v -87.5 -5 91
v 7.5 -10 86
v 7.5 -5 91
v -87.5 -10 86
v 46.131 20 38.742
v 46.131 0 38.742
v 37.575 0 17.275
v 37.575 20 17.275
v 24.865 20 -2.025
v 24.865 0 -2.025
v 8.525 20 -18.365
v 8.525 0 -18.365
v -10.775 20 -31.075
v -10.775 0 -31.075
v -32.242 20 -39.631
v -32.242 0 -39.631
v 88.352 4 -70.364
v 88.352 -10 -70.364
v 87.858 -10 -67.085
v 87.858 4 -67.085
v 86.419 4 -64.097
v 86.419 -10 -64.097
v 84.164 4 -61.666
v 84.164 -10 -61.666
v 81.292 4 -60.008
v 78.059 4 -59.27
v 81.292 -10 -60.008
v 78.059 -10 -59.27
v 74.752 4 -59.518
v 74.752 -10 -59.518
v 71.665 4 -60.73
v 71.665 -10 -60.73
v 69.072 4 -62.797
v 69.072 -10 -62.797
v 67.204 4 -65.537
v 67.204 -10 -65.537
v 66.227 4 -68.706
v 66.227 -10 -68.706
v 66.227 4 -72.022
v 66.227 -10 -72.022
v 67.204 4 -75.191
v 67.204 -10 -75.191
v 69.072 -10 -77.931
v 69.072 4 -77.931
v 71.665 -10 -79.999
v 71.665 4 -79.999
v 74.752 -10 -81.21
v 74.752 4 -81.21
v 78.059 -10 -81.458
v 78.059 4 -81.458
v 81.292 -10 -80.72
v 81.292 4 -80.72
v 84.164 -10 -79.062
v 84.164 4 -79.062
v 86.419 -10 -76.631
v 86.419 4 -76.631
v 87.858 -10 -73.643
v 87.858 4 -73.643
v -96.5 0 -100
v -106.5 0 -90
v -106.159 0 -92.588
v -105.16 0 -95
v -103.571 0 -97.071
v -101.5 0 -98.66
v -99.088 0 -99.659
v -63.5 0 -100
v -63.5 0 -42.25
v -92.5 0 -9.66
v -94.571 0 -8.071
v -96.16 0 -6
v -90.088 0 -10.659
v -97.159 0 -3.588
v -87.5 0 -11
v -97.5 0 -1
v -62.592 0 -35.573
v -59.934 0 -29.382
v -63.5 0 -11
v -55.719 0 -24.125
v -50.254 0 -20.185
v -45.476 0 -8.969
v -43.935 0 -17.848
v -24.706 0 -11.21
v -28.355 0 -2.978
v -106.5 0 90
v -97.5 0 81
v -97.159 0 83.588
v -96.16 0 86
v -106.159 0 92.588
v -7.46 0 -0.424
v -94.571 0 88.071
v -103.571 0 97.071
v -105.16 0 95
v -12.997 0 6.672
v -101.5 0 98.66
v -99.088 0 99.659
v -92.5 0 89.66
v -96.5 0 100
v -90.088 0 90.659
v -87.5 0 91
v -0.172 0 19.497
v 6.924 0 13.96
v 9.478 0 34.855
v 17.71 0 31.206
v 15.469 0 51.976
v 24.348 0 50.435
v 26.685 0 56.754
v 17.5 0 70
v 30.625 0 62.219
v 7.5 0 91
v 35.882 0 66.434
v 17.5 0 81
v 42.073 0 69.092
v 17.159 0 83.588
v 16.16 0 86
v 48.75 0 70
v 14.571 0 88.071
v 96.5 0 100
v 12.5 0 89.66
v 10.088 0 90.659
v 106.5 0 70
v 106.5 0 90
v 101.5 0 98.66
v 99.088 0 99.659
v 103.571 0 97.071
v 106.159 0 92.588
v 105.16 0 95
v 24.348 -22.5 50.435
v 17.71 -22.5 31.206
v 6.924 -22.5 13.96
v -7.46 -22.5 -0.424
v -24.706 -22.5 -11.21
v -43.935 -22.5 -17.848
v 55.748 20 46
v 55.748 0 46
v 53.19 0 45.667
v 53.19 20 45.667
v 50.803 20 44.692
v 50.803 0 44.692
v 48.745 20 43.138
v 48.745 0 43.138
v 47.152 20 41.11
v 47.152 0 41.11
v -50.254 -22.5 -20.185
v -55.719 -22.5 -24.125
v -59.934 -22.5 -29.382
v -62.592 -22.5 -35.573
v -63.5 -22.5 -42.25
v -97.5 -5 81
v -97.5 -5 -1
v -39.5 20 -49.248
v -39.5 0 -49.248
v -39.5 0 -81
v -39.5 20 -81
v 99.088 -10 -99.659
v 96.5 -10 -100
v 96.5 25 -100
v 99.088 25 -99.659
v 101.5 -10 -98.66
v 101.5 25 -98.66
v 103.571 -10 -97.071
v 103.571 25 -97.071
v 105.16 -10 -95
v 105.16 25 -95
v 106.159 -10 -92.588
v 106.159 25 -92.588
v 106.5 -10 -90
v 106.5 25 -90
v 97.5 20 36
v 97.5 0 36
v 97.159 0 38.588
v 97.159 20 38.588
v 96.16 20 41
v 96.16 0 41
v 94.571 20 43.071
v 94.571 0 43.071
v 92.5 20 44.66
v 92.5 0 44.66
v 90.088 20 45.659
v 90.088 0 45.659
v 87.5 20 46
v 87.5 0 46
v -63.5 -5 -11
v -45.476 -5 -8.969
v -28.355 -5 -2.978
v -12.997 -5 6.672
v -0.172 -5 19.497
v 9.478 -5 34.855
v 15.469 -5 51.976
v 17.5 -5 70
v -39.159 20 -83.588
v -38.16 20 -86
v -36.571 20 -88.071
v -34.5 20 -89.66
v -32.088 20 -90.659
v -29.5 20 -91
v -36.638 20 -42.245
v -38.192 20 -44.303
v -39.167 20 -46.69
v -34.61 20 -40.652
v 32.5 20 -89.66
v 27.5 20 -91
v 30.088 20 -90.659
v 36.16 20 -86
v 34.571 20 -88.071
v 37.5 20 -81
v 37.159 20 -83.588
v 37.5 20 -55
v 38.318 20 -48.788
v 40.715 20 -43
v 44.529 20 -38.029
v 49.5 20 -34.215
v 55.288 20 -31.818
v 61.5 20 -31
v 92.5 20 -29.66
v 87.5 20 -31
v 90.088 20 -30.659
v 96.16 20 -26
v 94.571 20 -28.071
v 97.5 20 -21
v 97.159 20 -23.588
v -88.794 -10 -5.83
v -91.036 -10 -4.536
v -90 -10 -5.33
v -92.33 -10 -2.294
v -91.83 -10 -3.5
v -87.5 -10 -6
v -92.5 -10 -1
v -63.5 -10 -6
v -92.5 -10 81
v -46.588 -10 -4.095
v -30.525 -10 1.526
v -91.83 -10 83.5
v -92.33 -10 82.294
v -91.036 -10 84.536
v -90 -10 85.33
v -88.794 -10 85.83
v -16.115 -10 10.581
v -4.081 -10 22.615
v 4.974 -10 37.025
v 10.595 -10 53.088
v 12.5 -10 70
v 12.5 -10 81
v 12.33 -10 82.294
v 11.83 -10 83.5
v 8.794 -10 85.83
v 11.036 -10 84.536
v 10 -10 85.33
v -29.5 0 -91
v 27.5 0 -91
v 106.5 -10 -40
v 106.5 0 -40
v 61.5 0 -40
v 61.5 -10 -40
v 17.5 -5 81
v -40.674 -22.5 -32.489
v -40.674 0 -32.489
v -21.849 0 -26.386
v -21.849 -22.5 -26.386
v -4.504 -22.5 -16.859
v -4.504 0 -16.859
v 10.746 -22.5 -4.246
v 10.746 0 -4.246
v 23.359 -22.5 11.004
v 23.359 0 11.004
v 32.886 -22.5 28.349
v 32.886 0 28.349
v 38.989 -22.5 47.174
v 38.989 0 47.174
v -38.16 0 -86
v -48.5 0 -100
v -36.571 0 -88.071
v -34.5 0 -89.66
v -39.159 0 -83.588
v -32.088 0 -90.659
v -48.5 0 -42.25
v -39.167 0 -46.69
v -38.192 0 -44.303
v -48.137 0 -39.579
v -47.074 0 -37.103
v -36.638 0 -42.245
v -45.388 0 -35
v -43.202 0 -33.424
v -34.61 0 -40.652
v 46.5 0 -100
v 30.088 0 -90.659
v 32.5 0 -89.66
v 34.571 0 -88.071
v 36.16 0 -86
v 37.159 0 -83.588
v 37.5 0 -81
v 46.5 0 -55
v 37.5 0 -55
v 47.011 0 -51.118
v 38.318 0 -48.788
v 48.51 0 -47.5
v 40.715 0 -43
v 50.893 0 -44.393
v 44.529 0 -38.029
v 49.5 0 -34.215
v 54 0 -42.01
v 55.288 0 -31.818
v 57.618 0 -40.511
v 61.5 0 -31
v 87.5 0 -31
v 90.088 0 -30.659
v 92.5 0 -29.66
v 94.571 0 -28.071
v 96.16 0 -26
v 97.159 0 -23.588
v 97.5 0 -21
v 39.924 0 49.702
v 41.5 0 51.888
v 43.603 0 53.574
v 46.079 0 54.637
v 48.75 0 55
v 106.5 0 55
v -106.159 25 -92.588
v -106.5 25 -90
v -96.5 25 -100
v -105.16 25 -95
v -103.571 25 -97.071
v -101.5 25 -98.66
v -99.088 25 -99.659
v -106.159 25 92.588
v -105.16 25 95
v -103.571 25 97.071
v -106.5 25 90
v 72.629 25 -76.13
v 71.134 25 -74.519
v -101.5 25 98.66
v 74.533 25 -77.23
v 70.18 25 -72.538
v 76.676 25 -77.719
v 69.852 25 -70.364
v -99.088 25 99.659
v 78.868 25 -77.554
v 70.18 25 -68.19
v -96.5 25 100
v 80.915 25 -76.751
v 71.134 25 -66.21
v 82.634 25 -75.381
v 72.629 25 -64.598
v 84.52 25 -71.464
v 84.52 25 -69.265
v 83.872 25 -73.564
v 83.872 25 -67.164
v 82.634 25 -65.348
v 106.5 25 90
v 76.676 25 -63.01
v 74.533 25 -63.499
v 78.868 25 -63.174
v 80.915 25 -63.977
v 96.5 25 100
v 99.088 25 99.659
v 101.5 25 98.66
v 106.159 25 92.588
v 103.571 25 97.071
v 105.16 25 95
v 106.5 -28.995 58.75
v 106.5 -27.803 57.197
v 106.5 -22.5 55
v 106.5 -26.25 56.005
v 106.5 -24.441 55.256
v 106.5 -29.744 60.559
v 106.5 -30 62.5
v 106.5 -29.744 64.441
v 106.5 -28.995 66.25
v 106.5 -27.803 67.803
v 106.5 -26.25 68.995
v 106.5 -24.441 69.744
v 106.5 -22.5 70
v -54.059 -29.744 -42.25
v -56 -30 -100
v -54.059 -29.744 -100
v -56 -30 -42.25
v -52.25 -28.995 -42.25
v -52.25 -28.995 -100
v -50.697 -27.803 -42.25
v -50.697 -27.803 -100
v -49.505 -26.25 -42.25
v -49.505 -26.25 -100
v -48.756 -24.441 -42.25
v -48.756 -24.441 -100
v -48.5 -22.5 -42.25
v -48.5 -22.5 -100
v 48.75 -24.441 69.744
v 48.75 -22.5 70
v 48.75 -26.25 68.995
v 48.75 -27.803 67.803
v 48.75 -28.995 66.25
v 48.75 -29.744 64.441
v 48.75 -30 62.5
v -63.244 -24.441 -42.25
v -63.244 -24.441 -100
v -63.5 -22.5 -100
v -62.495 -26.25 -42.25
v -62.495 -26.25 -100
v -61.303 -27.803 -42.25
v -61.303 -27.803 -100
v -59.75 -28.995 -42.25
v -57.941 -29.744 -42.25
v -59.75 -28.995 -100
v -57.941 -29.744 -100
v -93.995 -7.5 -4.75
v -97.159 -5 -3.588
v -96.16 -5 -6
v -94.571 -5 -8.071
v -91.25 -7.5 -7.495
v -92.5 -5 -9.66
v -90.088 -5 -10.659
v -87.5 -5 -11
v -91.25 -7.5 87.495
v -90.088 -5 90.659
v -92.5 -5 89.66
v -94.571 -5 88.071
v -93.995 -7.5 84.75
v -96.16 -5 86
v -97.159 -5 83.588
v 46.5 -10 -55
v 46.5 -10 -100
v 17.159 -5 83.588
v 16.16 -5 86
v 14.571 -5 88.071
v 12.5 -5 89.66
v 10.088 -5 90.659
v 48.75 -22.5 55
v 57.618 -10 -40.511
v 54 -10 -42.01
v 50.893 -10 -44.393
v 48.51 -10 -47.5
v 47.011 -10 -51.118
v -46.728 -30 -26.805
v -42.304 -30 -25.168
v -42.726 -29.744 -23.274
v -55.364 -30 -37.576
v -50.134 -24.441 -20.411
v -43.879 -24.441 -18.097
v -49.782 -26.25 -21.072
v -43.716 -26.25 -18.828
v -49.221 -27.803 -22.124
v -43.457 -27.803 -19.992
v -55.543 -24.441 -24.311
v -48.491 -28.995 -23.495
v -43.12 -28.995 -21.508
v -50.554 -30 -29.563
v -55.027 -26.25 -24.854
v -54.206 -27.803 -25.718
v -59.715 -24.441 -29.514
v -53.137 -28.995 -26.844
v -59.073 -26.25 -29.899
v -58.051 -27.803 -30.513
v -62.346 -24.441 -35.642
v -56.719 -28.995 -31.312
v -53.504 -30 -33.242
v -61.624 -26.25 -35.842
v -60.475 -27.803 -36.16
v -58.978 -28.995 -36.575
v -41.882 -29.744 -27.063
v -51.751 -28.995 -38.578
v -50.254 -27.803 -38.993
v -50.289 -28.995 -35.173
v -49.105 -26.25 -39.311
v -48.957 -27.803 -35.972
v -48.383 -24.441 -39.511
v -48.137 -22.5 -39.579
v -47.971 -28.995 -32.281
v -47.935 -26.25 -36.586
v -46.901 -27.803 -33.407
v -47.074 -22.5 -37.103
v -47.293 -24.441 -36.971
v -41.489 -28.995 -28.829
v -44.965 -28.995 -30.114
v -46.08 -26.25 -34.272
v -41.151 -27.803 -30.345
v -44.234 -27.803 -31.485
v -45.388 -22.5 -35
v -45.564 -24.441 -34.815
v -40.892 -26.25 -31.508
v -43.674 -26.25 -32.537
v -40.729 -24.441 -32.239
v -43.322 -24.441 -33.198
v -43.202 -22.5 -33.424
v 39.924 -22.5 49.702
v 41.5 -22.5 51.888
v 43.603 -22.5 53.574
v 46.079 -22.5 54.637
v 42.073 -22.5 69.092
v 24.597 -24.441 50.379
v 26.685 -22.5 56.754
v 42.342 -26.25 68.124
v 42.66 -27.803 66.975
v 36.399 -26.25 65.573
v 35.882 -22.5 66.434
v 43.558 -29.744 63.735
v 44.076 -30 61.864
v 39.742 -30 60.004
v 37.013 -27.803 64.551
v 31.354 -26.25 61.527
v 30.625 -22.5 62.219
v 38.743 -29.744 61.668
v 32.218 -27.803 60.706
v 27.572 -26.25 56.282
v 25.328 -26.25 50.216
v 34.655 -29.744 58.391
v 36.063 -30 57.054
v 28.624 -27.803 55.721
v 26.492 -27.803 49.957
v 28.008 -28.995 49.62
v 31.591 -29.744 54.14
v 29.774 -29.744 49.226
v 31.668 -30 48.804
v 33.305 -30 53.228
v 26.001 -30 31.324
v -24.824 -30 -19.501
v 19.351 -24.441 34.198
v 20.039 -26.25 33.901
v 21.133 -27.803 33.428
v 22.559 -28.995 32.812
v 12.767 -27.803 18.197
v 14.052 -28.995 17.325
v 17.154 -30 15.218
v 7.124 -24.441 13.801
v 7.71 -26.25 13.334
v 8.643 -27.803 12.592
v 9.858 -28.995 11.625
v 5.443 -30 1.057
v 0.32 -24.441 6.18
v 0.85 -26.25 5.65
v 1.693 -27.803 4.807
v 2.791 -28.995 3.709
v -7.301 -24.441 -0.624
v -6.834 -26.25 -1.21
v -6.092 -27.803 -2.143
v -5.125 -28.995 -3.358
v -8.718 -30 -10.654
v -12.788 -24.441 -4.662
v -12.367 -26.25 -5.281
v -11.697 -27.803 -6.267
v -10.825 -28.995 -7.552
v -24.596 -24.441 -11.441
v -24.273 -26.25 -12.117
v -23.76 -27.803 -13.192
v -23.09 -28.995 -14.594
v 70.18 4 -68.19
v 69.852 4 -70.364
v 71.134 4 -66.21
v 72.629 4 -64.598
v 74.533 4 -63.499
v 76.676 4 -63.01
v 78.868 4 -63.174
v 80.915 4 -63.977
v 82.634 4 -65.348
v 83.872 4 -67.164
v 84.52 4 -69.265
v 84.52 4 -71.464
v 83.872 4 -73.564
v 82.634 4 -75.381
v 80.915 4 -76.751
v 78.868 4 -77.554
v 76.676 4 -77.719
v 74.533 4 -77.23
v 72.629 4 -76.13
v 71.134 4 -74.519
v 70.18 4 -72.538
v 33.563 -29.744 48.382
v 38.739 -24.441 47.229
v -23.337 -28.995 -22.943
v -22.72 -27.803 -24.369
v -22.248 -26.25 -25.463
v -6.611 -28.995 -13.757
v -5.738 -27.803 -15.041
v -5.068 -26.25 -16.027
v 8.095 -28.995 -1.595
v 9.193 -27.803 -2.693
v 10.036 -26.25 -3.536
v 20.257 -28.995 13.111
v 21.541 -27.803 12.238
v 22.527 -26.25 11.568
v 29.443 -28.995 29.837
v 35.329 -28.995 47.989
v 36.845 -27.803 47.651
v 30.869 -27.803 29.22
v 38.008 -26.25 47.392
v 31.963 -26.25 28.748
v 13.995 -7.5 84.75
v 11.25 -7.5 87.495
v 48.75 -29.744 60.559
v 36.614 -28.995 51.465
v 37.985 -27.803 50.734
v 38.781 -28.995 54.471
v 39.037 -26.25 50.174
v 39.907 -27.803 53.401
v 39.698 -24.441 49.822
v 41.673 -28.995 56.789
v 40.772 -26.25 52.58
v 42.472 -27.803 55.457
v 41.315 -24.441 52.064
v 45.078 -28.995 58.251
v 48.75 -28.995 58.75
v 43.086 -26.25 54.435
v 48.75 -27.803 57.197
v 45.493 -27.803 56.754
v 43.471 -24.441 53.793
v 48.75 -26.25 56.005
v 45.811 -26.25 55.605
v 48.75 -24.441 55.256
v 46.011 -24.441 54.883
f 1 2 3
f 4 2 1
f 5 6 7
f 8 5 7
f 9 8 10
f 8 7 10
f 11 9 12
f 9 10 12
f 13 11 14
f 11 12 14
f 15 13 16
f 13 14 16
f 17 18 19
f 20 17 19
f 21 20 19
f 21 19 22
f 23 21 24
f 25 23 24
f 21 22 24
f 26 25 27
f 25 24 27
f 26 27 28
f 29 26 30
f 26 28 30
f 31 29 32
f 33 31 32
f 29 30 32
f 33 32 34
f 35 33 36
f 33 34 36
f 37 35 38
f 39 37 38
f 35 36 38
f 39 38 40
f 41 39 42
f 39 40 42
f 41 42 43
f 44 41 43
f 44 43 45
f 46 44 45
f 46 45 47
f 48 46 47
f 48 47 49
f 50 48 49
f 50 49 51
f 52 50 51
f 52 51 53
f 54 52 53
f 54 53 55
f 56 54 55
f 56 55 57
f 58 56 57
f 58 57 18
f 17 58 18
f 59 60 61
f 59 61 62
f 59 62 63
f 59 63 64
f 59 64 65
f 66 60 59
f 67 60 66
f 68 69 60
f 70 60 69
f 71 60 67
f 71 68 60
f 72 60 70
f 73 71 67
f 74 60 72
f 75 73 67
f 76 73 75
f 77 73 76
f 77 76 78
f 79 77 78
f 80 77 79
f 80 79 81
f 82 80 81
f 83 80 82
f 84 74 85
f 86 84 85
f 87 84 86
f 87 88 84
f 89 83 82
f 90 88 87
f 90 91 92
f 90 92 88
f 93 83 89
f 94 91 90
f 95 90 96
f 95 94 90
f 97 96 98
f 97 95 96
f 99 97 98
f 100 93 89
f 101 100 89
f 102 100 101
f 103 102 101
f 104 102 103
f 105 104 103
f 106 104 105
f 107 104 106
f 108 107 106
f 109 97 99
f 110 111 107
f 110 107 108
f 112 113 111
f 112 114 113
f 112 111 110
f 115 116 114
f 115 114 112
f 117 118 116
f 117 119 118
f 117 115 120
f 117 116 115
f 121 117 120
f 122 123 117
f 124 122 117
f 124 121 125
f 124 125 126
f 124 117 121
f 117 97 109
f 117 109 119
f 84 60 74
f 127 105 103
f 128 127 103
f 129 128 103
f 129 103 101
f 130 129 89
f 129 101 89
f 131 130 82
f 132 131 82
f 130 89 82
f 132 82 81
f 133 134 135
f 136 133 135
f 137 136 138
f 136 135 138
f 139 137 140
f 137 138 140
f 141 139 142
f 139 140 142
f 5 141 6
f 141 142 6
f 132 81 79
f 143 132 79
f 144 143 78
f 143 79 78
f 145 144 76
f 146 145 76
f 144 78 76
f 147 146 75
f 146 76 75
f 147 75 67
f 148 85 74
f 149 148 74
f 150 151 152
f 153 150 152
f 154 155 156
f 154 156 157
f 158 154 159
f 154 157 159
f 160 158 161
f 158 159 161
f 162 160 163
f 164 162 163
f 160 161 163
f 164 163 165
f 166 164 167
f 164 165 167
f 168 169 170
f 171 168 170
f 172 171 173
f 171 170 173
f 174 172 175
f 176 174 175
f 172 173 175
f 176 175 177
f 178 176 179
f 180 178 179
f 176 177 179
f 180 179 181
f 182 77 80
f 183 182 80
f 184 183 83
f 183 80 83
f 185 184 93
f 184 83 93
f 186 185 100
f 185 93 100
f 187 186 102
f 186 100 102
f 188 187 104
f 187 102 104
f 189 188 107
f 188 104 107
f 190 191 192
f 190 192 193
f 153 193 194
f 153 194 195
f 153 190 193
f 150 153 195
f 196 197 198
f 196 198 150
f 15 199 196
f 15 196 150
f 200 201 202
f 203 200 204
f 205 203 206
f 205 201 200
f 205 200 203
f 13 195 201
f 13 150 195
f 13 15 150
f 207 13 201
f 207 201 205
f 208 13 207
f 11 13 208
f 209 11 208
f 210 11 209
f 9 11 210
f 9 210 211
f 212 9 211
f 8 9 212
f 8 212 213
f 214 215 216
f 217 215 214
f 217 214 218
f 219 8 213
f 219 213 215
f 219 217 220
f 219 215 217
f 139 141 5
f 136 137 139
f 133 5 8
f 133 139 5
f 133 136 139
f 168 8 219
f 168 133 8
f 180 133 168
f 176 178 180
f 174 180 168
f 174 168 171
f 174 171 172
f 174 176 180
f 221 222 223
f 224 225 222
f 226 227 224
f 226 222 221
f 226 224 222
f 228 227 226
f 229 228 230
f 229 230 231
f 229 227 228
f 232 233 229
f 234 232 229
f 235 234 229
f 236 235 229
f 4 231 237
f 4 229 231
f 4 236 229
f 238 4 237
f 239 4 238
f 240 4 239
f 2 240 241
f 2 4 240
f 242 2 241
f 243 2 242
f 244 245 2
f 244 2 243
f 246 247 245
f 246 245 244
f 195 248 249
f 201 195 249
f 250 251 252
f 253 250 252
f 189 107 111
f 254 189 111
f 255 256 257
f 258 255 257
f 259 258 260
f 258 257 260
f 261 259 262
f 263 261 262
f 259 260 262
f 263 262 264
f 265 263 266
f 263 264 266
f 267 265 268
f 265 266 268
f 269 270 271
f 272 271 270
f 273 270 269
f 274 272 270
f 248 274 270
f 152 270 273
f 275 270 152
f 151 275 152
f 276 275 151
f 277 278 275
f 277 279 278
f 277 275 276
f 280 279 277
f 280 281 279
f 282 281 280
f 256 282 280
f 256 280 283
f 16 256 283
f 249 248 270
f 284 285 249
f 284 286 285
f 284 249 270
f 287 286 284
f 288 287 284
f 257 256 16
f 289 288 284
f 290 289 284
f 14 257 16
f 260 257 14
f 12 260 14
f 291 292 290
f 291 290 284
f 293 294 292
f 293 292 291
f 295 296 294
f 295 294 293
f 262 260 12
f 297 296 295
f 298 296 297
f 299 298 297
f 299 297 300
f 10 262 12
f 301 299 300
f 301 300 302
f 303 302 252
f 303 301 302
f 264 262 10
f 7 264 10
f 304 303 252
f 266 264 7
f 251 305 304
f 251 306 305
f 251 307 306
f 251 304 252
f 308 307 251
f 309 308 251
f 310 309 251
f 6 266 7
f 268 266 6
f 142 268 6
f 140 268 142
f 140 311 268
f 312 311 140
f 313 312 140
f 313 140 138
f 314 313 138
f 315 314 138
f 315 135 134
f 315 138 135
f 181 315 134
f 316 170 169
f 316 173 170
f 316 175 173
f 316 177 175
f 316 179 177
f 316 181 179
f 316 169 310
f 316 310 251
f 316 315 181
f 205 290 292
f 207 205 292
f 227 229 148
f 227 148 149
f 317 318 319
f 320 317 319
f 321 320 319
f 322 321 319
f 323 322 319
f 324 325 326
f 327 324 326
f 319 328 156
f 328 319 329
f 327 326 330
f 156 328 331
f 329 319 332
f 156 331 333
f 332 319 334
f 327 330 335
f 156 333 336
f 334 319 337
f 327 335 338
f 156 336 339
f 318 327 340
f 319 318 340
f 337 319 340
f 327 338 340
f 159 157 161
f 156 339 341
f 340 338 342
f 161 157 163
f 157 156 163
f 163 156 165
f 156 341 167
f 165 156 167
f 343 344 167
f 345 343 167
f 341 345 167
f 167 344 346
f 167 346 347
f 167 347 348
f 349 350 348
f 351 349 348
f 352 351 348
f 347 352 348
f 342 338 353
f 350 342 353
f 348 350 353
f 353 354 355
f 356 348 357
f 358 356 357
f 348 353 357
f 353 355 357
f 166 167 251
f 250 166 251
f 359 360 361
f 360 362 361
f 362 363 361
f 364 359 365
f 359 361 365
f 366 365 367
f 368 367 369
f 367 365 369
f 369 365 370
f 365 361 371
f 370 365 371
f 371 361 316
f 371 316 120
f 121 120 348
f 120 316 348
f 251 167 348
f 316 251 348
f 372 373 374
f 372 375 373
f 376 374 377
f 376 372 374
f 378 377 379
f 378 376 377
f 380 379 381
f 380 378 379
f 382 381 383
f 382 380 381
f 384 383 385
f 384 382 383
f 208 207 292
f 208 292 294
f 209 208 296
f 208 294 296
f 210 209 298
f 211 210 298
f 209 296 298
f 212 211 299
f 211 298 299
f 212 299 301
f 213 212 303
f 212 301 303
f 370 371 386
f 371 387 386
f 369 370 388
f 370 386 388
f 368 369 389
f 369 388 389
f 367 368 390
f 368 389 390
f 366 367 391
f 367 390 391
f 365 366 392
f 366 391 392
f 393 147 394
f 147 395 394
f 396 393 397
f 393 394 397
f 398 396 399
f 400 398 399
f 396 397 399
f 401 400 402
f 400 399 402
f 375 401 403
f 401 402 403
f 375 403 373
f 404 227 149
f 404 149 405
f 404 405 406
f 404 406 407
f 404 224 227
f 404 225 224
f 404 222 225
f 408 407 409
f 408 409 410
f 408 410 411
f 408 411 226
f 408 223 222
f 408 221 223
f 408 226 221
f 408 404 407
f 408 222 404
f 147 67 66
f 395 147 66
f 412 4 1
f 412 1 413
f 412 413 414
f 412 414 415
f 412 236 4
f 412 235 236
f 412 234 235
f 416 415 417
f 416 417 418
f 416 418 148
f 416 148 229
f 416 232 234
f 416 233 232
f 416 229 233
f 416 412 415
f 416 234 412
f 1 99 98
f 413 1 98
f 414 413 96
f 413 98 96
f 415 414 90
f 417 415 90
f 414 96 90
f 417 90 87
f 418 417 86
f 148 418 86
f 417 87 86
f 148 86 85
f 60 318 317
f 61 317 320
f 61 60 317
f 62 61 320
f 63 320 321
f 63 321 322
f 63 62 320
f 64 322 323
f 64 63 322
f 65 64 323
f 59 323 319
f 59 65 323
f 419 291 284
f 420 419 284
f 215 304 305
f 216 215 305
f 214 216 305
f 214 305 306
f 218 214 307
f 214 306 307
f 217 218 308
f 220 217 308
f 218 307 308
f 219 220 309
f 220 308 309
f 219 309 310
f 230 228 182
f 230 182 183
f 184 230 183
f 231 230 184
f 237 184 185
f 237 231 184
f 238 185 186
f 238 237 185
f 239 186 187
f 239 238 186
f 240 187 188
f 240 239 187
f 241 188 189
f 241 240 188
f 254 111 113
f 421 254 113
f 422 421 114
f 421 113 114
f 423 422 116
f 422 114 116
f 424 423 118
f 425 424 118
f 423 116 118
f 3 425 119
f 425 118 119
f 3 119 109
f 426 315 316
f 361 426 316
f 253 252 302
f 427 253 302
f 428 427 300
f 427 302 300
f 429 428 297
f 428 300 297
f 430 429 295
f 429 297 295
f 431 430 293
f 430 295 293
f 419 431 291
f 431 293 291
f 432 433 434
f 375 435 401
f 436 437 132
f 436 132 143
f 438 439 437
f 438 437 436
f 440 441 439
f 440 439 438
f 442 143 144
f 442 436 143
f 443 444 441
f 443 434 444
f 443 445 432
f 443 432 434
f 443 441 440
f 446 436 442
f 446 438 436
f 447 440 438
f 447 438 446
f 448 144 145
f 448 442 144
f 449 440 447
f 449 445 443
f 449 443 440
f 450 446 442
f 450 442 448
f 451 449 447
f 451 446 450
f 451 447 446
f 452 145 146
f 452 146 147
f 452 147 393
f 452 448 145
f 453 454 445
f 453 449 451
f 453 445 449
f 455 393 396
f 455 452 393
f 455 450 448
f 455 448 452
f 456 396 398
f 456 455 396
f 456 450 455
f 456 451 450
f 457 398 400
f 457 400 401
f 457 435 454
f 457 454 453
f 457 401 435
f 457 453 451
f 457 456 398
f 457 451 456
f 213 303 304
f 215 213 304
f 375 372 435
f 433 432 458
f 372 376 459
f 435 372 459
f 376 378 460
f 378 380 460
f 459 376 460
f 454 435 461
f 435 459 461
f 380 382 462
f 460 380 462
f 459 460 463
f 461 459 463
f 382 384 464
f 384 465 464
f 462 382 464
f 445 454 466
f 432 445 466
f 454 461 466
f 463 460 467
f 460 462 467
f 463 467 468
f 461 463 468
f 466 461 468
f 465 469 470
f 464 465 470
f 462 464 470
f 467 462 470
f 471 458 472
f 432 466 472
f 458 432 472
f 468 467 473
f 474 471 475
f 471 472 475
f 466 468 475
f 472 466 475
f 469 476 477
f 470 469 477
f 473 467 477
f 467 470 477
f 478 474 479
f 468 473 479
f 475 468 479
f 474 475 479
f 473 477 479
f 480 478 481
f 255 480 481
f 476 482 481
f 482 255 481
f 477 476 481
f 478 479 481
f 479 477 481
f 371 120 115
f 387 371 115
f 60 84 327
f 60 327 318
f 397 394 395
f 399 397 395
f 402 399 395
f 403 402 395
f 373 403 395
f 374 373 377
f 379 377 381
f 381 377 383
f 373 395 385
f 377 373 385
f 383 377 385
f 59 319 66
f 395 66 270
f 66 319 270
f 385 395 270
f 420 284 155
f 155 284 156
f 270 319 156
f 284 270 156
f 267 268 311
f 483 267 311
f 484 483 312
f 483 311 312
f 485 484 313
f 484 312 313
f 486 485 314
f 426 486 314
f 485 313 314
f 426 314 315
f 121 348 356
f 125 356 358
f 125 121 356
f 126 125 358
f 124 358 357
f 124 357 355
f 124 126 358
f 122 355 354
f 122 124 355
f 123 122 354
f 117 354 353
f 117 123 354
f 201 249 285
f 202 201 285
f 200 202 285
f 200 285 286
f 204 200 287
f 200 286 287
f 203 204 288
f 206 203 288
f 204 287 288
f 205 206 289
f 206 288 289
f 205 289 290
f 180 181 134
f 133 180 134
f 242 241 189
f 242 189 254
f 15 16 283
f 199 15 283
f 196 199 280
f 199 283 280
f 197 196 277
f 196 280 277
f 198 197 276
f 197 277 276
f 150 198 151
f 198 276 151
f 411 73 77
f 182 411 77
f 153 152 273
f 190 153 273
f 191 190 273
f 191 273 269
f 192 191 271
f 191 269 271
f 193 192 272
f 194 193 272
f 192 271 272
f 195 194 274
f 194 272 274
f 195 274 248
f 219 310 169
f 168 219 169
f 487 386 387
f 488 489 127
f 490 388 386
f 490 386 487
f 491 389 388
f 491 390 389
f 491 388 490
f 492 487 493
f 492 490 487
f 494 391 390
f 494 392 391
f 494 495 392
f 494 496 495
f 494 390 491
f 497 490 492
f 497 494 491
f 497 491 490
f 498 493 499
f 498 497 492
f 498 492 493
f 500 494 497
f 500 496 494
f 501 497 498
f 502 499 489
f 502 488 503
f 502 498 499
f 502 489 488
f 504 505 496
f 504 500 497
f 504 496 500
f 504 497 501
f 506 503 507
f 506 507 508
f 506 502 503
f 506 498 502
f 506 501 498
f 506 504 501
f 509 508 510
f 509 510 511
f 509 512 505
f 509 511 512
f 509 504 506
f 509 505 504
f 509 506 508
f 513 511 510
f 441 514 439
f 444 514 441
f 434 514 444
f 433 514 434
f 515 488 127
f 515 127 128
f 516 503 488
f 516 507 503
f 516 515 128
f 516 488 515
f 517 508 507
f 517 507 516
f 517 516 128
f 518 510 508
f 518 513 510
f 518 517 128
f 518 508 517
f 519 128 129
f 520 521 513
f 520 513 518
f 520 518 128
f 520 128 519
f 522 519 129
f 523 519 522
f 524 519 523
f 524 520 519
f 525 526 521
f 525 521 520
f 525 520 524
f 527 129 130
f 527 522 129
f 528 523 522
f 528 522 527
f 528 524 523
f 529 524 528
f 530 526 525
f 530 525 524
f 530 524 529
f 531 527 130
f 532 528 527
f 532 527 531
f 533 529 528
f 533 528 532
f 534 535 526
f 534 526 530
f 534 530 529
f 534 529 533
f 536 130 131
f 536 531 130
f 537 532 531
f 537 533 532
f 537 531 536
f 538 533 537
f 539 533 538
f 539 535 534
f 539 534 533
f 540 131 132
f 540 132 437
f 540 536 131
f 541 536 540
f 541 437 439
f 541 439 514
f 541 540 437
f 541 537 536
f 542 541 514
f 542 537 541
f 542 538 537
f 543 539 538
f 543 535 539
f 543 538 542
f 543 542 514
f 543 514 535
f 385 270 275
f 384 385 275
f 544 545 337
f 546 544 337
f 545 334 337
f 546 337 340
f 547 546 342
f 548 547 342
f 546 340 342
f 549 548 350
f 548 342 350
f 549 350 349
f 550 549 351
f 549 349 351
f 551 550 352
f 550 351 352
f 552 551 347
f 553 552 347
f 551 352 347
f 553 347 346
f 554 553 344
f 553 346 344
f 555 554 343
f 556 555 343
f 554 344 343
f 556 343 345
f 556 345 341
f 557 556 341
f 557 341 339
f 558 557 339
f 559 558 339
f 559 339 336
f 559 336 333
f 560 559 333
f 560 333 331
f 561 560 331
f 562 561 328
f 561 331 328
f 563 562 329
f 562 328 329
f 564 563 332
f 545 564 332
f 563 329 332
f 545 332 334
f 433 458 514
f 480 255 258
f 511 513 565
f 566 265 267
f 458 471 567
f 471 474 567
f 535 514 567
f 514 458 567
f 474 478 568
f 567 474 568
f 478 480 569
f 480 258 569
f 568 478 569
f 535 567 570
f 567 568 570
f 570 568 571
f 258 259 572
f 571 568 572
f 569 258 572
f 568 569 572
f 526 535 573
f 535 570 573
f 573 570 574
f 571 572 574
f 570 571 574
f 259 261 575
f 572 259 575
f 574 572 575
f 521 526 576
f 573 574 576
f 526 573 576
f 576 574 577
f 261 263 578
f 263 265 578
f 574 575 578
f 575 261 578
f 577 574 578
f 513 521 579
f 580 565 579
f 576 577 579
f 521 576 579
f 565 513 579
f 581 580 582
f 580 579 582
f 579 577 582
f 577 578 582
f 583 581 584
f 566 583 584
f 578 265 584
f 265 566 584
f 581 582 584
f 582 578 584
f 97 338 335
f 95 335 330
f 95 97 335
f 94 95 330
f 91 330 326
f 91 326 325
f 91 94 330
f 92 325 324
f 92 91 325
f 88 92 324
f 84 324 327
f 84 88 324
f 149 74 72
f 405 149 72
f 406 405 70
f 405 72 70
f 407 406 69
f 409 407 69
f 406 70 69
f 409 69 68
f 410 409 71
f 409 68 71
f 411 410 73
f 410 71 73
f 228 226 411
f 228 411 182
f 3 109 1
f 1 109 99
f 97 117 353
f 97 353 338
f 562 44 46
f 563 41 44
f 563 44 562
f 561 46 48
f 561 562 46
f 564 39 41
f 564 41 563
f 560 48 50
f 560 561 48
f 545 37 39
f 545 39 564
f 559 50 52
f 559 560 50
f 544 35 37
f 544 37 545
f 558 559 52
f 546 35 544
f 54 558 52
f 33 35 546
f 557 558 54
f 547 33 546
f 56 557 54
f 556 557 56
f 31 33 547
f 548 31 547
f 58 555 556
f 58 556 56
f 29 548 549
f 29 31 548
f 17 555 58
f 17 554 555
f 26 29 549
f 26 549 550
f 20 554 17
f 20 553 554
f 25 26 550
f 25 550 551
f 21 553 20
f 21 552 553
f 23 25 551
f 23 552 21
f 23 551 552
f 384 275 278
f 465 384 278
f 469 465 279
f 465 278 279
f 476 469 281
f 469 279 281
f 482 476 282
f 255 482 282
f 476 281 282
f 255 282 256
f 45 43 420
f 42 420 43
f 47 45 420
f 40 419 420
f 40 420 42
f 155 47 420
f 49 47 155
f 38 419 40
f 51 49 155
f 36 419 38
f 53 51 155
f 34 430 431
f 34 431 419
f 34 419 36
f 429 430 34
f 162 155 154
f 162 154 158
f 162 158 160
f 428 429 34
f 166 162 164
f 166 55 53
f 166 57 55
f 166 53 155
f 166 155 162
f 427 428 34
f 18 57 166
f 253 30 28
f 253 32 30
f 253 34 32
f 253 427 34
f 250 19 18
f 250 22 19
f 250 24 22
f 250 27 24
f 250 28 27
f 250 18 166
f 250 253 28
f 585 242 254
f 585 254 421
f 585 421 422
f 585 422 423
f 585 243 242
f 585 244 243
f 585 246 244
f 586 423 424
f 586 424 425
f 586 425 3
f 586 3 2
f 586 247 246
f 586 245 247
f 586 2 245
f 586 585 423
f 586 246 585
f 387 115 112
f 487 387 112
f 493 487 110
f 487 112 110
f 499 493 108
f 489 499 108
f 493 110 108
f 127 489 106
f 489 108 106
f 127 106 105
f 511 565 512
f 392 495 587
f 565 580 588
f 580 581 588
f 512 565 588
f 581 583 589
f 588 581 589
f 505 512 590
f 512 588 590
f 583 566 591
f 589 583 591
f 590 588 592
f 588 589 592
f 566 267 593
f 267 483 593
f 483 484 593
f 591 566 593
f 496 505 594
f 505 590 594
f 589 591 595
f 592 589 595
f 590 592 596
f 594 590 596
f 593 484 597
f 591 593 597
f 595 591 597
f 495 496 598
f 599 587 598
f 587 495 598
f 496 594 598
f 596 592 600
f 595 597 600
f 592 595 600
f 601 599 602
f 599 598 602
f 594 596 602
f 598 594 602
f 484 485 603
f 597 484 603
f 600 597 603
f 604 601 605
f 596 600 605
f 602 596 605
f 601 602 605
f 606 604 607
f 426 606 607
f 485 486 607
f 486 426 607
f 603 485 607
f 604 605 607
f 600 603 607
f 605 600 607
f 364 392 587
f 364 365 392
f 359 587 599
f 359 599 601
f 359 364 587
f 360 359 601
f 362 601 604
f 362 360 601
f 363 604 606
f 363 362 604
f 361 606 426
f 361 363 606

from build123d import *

# Parameters (mm, degrees)
F1_DEPTH       = 25
F2_DEPTH       = 10
F3_DEPTH       = 30
F4_DEPTH       = 20
F5_DEPTH       = 10
F7_D           = 14.75
F7_CBORE_D     = 22.25
F7_CBORE_DEPTH = 14
F8_SIZE        = 5
F9_R           = 7.49999


# Not quite as in the source:
# - a fillet or chamfer is up to 0.001 mm smaller than in the source, because OpenCascade refuses the exact size


with BuildPart() as f1:
    # F0 (on Front) → F1 (new body)
    with BuildSketch(Plane.XZ):
        with BuildLine():
            Line((96.5, 100), (-96.5, 100))
            ThreePointArc((-96.5, 100), (-103.5710678119, 97.0710678119), (-106.5, 90))
            Line((-106.5, 90), (-106.5, -90))
            ThreePointArc((-106.5, -90), (-103.5710678119, -97.0710678119), (-96.5, -100))
            Line((-96.5, -100), (-63.5, -100))
            Line((-63.5, -100), (-63.5, -42.2497216032))
            ThreePointArc((-63.5, -42.2497216032), (-58.0047374401, -26.6111405489), (-43.9347826087, -17.8476082112))
            ThreePointArc((-43.9347826087, -17.8476082112), (0.1396103068, 6.3603896932), (24.3476082112, 50.4347826087))
            ThreePointArc((24.3476082112, 50.4347826087), (33.1111405489, 64.5047374401), (48.7497216032, 70))
            Line((48.7497216032, 70), (106.5, 70))
            Line((106.5, 70), (106.5, 90))
            ThreePointArc((106.5, 90), (103.5710678119, 97.0710678119), (96.5, 100))
        make_face()
        with BuildLine():
            ThreePointArc((17.5, 70), (-6.2243507239, 12.7243507239), (-63.5, -11))
            Line((-63.5, -11), (-87.5, -11))
            ThreePointArc((-87.5, -11), (-94.5710678119, -8.0710678119), (-97.5, -1))
            Line((-97.5, -1), (-97.5, 81))
            ThreePointArc((-97.5, 81), (-94.5710678119, 88.0710678119), (-87.5, 91))
            Line((-87.5, 91), (7.5, 91))
            ThreePointArc((7.5, 91), (14.5710678119, 88.0710678119), (17.5, 81))
            Line((17.5, 81), (17.5, 70))
        make_face(mode=Mode.SUBTRACT)
        with BuildLine():
            Line((106.5, 55), (106.5, 70))
            Line((106.5, 70), (48.7497216032, 70))
            ThreePointArc((48.7497216032, 70), (33.1111405489, 64.5047374401), (24.3476082112, 50.4347826087))
            ThreePointArc((24.3476082112, 50.4347826087), (0.1396103068, 6.3603896932), (-43.9347826087, -17.8476082112))
            ThreePointArc((-43.9347826087, -17.8476082112), (-58.0047374401, -26.6111405489), (-63.5, -42.2497216032))
            Line((-63.5, -42.2497216032), (-63.5, -100))
            Line((-63.5, -100), (-48.5, -100))
            Line((-48.5, -100), (-48.5, -42.2497216032))
            ThreePointArc((-48.5, -42.2497216032), (-46.3018949761, -35.9942891815), (-40.6739130435, -32.4888762464))
            ThreePointArc((-40.6739130435, -32.4888762464), (10.7462120246, -4.2462120246), (38.9888762464, 47.1739130435))
            ThreePointArc((38.9888762464, 47.1739130435), (42.4942891815, 52.8018949761), (48.7497216032, 55))
            Line((48.7497216032, 55), (106.5, 55))
        make_face()
        with BuildLine():
            Line((106.5, -40), (106.5, 55))
            Line((106.5, 55), (48.7497216032, 55))
            ThreePointArc((48.7497216032, 55), (42.4942891815, 52.8018949761), (38.9888762464, 47.1739130435))
            ThreePointArc((38.9888762464, 47.1739130435), (10.7462120246, -4.2462120246), (-40.6739130435, -32.4888762464))
            ThreePointArc((-40.6739130435, -32.4888762464), (-46.3018949761, -35.9942891815), (-48.5, -42.2497216032))
            Line((-48.5, -42.2497216032), (-48.5, -100))
            Line((-48.5, -100), (46.5, -100))
            Line((46.5, -100), (46.5, -55))
            ThreePointArc((46.5, -55), (50.8933982822, -44.3933982822), (61.5, -40))
            Line((61.5, -40), (106.5, -40))
        make_face()
        with BuildLine():
            ThreePointArc((46.130896205, 38.7419354839), (49.7234965193, 43.981834214), (55.7476414861, 46))
            Line((55.7476414861, 46), (87.5, 46))
            ThreePointArc((87.5, 46), (94.5710678119, 43.0710678119), (97.5, 36))
            Line((97.5, 36), (97.5, -21))
            ThreePointArc((97.5, -21), (94.5710678119, -28.0710678119), (87.5, -31))
            Line((87.5, -31), (61.5, -31))
            ThreePointArc((61.5, -31), (44.5294372515, -38.0294372515), (37.5, -55))
            Line((37.5, -55), (37.5, -81))
            ThreePointArc((37.5, -81), (34.5710678119, -88.0710678119), (27.5, -91))
            Line((27.5, -91), (-29.5, -91))
            ThreePointArc((-29.5, -91), (-36.5710678119, -88.0710678119), (-39.5, -81))
            Line((-39.5, -81), (-39.5, -49.2476414861))
            ThreePointArc((-39.5, -49.2476414861), (-37.481834214, -43.2234965193), (-32.2419354839, -39.630896205))
            ThreePointArc((-32.2419354839, -39.630896205), (17.1101730553, -10.6101730553), (46.130896205, 38.7419354839))
        make_face(mode=Mode.SUBTRACT)
        with BuildLine():
            Line((106.5, -90), (106.5, -40))
            Line((106.5, -40), (61.5, -40))
            ThreePointArc((61.5, -40), (50.8933982822, -44.3933982822), (46.5, -55))
            Line((46.5, -55), (46.5, -100))
            Line((46.5, -100), (96.5, -100))
            ThreePointArc((96.5, -100), (103.5710678119, -97.0710678119), (106.5, -90))
        make_face()
        with BuildLine():
            Line((-87.5, -11), (-63.5, -11))
            ThreePointArc((-63.5, -11), (-6.2243507239, 12.7243507239), (17.5, 70))
            Line((17.5, 70), (17.5, 81))
            ThreePointArc((17.5, 81), (14.5710678119, 88.0710678119), (7.5, 91))
            Line((7.5, 91), (-87.5, 91))
            ThreePointArc((-87.5, 91), (-94.5710678119, 88.0710678119), (-97.5, 81))
            Line((-97.5, 81), (-97.5, -1))
            ThreePointArc((-97.5, -1), (-94.5710678119, -8.0710678119), (-87.5, -11))
        make_face()
        with BuildLine():
            Line((87.5, 46), (55.7476414861, 46))
            ThreePointArc((55.7476414861, 46), (49.7234965193, 43.981834214), (46.130896205, 38.7419354839))
            ThreePointArc((46.130896205, 38.7419354839), (17.1101730553, -10.6101730553), (-32.2419354839, -39.630896205))
            ThreePointArc((-32.2419354839, -39.630896205), (-37.481834214, -43.2234965193), (-39.5, -49.2476414861))
            Line((-39.5, -49.2476414861), (-39.5, -81))
            ThreePointArc((-39.5, -81), (-36.5710678119, -88.0710678119), (-29.5, -91))
            Line((-29.5, -91), (27.5, -91))
            ThreePointArc((27.5, -91), (34.5710678119, -88.0710678119), (37.5, -81))
            Line((37.5, -81), (37.5, -55))
            ThreePointArc((37.5, -55), (44.5294372515, -38.0294372515), (61.5, -31))
            Line((61.5, -31), (87.5, -31))
            ThreePointArc((87.5, -31), (94.5710678119, -28.0710678119), (97.5, -21))
            Line((97.5, -21), (97.5, 36))
            ThreePointArc((97.5, 36), (94.5710678119, 43.0710678119), (87.5, 46))
        make_face()
    extrude(amount=-F1_DEPTH)

    # F0 (on Front) → F2 (join)
    with BuildSketch(Plane.XZ):
        with BuildLine():
            Line((-87.5, -11), (-63.5, -11))
            ThreePointArc((-63.5, -11), (-6.2243507239, 12.7243507239), (17.5, 70))
            Line((17.5, 70), (17.5, 81))
            ThreePointArc((17.5, 81), (14.5710678119, 88.0710678119), (7.5, 91))
            Line((7.5, 91), (-87.5, 91))
            ThreePointArc((-87.5, 91), (-94.5710678119, 88.0710678119), (-97.5, 81))
            Line((-97.5, 81), (-97.5, -1))
            ThreePointArc((-97.5, -1), (-94.5710678119, -8.0710678119), (-87.5, -11))
        make_face()
    extrude(amount=F2_DEPTH)

    # F0 (on Front) → F3 (join)
    with BuildSketch(Plane.XZ):
        with BuildLine():
            Line((106.5, 55), (106.5, 70))
            Line((106.5, 70), (48.7497216032, 70))
            ThreePointArc((48.7497216032, 70), (33.1111405489, 64.5047374401), (24.3476082112, 50.4347826087))
            ThreePointArc((24.3476082112, 50.4347826087), (0.1396103068, 6.3603896932), (-43.9347826087, -17.8476082112))
            ThreePointArc((-43.9347826087, -17.8476082112), (-58.0047374401, -26.6111405489), (-63.5, -42.2497216032))
            Line((-63.5, -42.2497216032), (-63.5, -100))
            Line((-63.5, -100), (-48.5, -100))
            Line((-48.5, -100), (-48.5, -42.2497216032))
            ThreePointArc((-48.5, -42.2497216032), (-46.3018949761, -35.9942891815), (-40.6739130435, -32.4888762464))
            ThreePointArc((-40.6739130435, -32.4888762464), (10.7462120246, -4.2462120246), (38.9888762464, 47.1739130435))
            ThreePointArc((38.9888762464, 47.1739130435), (42.4942891815, 52.8018949761), (48.7497216032, 55))
            Line((48.7497216032, 55), (106.5, 55))
        make_face()
    extrude(amount=F3_DEPTH)

    # F0 (on Front) → F4 (cut)
    with BuildSketch(Plane.XZ):
        with BuildLine():
            Line((87.5, 46), (55.7476414861, 46))
            ThreePointArc((55.7476414861, 46), (49.7234965193, 43.981834214), (46.130896205, 38.7419354839))
            ThreePointArc((46.130896205, 38.7419354839), (17.1101730553, -10.6101730553), (-32.2419354839, -39.630896205))
            ThreePointArc((-32.2419354839, -39.630896205), (-37.481834214, -43.2234965193), (-39.5, -49.2476414861))
            Line((-39.5, -49.2476414861), (-39.5, -81))
            ThreePointArc((-39.5, -81), (-36.5710678119, -88.0710678119), (-29.5, -91))
            Line((-29.5, -91), (27.5, -91))
            ThreePointArc((27.5, -91), (34.5710678119, -88.0710678119), (37.5, -81))
            Line((37.5, -81), (37.5, -55))
            ThreePointArc((37.5, -55), (44.5294372515, -38.0294372515), (61.5, -31))
            Line((61.5, -31), (87.5, -31))
            ThreePointArc((87.5, -31), (94.5710678119, -28.0710678119), (97.5, -21))
            Line((97.5, -21), (97.5, 36))
            ThreePointArc((97.5, 36), (94.5710678119, 43.0710678119), (87.5, 46))
        make_face()
    extrude(amount=-F4_DEPTH, mode=Mode.SUBTRACT)

    # F0 (on Front) → F5 (join)
    with BuildSketch(Plane.XZ):
        with BuildLine():
            Line((106.5, -90), (106.5, -40))
            Line((106.5, -40), (61.5, -40))
            ThreePointArc((61.5, -40), (50.8933982822, -44.3933982822), (46.5, -55))
            Line((46.5, -55), (46.5, -100))
            Line((46.5, -100), (96.5, -100))
            ThreePointArc((96.5, -100), (103.5710678119, -97.0710678119), (106.5, -90))
        make_face()
    extrude(amount=F5_DEPTH)

    # F7 (through all)
    with Locations(Plane.XZ.offset(10)):
        with Locations((77.2273465991, -70.3643187881)):
            CounterBoreHole(F7_D / 2, F7_CBORE_D / 2, F7_CBORE_DEPTH)

    # F8
    f8_edges = [f1.edges().sort_by_distance(p)[0] for p in [
        (-97.5, -10, 40),
    ]]
    chamfer(f8_edges, length=F8_SIZE)

    # F9 (radius 7.5 in the source; OpenCascade refuses exactly that, so slightly less here)
    f9_edges = [f1.edges().sort_by_distance(p)[0] for p in [
        (-63.5, -30, -71.124861),
        (-48.5, -30, -71.124861),
    ]]
    fillet(f9_edges, radius=F9_R)


solid = f1.part
